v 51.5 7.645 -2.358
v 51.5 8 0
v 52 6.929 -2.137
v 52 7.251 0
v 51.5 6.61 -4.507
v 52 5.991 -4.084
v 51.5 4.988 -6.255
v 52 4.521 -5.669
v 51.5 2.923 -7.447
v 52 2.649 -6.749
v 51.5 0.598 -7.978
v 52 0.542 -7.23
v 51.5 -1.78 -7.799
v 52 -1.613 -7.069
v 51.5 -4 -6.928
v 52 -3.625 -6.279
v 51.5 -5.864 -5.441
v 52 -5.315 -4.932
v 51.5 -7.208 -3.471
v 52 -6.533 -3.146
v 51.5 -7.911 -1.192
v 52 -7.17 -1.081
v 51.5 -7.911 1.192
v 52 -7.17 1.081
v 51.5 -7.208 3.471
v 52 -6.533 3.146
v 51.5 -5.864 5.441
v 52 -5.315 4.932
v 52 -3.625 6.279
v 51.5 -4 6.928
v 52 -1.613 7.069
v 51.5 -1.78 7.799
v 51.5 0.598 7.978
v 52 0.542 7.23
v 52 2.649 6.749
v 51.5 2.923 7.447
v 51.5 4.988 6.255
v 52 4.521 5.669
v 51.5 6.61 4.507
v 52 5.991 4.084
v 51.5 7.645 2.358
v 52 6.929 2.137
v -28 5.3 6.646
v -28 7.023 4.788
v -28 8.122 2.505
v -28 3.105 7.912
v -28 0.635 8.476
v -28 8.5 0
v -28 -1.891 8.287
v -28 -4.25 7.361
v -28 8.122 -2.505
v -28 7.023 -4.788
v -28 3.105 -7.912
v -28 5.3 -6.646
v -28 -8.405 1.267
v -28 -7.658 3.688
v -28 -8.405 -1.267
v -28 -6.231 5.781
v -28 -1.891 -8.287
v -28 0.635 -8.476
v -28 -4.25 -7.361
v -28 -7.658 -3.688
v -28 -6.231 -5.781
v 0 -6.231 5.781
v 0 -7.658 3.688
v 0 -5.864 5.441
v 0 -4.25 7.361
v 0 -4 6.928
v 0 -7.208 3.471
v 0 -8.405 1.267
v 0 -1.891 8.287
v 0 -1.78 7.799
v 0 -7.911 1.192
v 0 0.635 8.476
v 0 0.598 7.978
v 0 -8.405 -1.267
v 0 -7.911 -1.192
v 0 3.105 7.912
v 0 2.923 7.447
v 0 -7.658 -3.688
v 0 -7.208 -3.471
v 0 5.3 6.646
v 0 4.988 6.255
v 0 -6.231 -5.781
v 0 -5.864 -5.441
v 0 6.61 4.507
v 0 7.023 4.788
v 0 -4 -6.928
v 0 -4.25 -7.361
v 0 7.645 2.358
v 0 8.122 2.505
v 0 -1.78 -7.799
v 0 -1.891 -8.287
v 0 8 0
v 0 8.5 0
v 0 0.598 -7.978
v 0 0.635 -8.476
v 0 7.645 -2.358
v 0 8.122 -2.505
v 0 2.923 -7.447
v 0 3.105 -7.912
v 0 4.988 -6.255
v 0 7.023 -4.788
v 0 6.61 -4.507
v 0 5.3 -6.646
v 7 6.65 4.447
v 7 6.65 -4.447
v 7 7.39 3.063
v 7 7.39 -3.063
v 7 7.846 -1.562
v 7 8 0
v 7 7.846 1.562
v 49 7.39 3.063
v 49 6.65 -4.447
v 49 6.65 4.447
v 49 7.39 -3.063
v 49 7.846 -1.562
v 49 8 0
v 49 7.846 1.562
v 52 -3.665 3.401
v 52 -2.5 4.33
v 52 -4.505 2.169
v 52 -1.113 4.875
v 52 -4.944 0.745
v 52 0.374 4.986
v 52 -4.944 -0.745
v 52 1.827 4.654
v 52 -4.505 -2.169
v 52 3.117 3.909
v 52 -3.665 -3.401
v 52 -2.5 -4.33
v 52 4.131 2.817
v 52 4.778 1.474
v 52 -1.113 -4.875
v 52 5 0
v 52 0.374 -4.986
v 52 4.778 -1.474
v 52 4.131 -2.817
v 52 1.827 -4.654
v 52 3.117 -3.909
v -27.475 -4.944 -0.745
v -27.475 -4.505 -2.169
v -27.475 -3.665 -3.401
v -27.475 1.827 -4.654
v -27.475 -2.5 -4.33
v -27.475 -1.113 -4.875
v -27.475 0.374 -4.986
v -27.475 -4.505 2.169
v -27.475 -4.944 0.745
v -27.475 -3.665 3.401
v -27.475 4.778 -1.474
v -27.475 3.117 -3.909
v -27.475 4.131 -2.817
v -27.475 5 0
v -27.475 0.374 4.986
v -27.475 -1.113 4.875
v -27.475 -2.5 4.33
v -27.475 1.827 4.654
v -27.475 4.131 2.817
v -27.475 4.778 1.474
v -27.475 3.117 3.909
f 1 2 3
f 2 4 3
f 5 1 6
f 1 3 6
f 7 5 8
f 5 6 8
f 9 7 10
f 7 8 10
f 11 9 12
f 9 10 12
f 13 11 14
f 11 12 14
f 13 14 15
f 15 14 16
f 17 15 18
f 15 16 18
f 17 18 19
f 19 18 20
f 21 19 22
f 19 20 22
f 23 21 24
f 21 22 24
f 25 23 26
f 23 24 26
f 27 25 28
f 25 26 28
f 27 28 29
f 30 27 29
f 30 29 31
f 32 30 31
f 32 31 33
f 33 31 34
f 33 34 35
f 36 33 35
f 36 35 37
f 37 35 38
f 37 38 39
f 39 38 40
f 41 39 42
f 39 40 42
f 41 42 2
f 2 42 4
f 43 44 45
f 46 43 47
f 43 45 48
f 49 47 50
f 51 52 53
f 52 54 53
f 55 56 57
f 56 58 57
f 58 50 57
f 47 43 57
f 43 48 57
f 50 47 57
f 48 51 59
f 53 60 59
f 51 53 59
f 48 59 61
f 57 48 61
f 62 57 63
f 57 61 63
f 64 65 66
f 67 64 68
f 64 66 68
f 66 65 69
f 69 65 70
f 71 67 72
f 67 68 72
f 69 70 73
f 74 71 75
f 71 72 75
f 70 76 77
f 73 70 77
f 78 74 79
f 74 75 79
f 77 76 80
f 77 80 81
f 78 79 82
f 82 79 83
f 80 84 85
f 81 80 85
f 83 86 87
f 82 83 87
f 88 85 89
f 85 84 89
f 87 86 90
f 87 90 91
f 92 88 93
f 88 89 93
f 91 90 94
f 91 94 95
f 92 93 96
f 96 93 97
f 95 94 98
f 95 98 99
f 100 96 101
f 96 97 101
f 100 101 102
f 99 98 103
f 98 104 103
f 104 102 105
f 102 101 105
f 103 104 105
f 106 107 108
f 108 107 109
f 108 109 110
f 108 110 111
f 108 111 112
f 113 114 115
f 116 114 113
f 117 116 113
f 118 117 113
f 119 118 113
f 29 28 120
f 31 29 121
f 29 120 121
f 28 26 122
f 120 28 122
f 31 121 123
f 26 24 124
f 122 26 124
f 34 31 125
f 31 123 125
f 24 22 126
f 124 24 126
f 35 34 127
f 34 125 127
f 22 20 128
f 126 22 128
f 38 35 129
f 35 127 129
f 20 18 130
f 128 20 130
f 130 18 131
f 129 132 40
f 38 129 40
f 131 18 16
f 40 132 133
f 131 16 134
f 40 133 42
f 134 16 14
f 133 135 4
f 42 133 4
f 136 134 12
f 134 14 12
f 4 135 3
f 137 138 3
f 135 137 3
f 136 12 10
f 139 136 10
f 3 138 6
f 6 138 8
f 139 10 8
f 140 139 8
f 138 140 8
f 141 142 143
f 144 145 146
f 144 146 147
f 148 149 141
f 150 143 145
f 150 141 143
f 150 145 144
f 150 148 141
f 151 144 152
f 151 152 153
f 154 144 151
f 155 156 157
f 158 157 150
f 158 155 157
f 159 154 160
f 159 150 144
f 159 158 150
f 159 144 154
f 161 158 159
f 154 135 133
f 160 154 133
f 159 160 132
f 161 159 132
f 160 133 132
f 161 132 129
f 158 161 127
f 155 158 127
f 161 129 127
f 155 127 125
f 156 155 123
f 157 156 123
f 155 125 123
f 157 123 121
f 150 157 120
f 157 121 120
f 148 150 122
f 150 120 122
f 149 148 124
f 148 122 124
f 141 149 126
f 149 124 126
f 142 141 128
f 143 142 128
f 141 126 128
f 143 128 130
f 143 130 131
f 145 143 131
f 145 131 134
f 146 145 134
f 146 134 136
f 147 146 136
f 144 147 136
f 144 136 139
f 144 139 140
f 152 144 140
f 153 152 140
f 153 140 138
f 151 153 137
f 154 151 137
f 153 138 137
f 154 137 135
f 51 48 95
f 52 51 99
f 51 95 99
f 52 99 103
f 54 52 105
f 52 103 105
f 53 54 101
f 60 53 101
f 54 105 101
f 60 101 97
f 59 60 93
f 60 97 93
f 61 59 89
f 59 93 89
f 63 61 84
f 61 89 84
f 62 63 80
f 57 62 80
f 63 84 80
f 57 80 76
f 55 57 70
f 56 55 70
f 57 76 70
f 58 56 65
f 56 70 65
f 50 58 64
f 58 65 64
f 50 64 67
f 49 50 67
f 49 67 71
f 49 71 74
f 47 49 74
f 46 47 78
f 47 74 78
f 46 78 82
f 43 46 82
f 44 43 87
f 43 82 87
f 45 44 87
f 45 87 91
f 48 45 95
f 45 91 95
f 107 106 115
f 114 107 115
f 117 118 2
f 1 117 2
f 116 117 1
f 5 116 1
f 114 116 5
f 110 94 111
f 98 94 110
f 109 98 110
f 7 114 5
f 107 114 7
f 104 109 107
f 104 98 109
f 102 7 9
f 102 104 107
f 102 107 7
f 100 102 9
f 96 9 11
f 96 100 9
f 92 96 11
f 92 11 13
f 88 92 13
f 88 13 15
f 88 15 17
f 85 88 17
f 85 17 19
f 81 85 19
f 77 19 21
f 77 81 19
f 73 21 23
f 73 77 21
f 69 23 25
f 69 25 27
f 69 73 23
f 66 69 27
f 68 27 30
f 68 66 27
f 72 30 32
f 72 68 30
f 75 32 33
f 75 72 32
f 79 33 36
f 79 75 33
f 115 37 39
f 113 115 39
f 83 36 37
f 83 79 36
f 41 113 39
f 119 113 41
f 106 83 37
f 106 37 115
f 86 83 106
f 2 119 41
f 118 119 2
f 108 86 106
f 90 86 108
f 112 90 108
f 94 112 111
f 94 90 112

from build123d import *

# Parameters (mm, degrees)
SKETCH2_W               = 42
SKETCH2_H               = 1.35
CUT_EXTRUDE1_DEPTH      = 10
CUT_EXTRUDE1_DEPTH_BACK = 10
SKETCH3_R               = 5
CUT_EXTRUDE2_DEPTH      = 79.475065146


with BuildPart() as part:
    # Sketch1 → Revolve1 (revolve)
    with BuildSketch(Plane.XY):
        Polygon((7, 8), (49, 8), (51.5, 8), (52, 7.25069297), (52, 0), (-28, 0), (-28, 8.5), (0, 8.5), (0, 8), align=None)
    revolve(axis=Axis((52, 0, 0), (-1, 0, 0)))

    # Sketch2 → Cut-Extrude1 (cut, two sides)
    with BuildSketch(Plane.XY) as cut_extrude1_sk:
        with Locations((28, 7.325)):
            Rectangle(SKETCH2_W, SKETCH2_H)
    extrude(amount=CUT_EXTRUDE1_DEPTH, mode=Mode.SUBTRACT)
    extrude(cut_extrude1_sk.sketch, amount=-CUT_EXTRUDE1_DEPTH_BACK, mode=Mode.SUBTRACT)

    # Sketch3 → Cut-Extrude2 (cut)
    with BuildSketch(Plane(origin=(52, 0, 0), x_dir=(0, 0, -1), z_dir=(1, 0, 0))):
        with Locations(Location((0, 0, 0), (0, 0, 90))):  # turned: the seam where the file's is
            Circle(SKETCH3_R)
    extrude(amount=-CUT_EXTRUDE2_DEPTH, mode=Mode.SUBTRACT)


solid = part.part
